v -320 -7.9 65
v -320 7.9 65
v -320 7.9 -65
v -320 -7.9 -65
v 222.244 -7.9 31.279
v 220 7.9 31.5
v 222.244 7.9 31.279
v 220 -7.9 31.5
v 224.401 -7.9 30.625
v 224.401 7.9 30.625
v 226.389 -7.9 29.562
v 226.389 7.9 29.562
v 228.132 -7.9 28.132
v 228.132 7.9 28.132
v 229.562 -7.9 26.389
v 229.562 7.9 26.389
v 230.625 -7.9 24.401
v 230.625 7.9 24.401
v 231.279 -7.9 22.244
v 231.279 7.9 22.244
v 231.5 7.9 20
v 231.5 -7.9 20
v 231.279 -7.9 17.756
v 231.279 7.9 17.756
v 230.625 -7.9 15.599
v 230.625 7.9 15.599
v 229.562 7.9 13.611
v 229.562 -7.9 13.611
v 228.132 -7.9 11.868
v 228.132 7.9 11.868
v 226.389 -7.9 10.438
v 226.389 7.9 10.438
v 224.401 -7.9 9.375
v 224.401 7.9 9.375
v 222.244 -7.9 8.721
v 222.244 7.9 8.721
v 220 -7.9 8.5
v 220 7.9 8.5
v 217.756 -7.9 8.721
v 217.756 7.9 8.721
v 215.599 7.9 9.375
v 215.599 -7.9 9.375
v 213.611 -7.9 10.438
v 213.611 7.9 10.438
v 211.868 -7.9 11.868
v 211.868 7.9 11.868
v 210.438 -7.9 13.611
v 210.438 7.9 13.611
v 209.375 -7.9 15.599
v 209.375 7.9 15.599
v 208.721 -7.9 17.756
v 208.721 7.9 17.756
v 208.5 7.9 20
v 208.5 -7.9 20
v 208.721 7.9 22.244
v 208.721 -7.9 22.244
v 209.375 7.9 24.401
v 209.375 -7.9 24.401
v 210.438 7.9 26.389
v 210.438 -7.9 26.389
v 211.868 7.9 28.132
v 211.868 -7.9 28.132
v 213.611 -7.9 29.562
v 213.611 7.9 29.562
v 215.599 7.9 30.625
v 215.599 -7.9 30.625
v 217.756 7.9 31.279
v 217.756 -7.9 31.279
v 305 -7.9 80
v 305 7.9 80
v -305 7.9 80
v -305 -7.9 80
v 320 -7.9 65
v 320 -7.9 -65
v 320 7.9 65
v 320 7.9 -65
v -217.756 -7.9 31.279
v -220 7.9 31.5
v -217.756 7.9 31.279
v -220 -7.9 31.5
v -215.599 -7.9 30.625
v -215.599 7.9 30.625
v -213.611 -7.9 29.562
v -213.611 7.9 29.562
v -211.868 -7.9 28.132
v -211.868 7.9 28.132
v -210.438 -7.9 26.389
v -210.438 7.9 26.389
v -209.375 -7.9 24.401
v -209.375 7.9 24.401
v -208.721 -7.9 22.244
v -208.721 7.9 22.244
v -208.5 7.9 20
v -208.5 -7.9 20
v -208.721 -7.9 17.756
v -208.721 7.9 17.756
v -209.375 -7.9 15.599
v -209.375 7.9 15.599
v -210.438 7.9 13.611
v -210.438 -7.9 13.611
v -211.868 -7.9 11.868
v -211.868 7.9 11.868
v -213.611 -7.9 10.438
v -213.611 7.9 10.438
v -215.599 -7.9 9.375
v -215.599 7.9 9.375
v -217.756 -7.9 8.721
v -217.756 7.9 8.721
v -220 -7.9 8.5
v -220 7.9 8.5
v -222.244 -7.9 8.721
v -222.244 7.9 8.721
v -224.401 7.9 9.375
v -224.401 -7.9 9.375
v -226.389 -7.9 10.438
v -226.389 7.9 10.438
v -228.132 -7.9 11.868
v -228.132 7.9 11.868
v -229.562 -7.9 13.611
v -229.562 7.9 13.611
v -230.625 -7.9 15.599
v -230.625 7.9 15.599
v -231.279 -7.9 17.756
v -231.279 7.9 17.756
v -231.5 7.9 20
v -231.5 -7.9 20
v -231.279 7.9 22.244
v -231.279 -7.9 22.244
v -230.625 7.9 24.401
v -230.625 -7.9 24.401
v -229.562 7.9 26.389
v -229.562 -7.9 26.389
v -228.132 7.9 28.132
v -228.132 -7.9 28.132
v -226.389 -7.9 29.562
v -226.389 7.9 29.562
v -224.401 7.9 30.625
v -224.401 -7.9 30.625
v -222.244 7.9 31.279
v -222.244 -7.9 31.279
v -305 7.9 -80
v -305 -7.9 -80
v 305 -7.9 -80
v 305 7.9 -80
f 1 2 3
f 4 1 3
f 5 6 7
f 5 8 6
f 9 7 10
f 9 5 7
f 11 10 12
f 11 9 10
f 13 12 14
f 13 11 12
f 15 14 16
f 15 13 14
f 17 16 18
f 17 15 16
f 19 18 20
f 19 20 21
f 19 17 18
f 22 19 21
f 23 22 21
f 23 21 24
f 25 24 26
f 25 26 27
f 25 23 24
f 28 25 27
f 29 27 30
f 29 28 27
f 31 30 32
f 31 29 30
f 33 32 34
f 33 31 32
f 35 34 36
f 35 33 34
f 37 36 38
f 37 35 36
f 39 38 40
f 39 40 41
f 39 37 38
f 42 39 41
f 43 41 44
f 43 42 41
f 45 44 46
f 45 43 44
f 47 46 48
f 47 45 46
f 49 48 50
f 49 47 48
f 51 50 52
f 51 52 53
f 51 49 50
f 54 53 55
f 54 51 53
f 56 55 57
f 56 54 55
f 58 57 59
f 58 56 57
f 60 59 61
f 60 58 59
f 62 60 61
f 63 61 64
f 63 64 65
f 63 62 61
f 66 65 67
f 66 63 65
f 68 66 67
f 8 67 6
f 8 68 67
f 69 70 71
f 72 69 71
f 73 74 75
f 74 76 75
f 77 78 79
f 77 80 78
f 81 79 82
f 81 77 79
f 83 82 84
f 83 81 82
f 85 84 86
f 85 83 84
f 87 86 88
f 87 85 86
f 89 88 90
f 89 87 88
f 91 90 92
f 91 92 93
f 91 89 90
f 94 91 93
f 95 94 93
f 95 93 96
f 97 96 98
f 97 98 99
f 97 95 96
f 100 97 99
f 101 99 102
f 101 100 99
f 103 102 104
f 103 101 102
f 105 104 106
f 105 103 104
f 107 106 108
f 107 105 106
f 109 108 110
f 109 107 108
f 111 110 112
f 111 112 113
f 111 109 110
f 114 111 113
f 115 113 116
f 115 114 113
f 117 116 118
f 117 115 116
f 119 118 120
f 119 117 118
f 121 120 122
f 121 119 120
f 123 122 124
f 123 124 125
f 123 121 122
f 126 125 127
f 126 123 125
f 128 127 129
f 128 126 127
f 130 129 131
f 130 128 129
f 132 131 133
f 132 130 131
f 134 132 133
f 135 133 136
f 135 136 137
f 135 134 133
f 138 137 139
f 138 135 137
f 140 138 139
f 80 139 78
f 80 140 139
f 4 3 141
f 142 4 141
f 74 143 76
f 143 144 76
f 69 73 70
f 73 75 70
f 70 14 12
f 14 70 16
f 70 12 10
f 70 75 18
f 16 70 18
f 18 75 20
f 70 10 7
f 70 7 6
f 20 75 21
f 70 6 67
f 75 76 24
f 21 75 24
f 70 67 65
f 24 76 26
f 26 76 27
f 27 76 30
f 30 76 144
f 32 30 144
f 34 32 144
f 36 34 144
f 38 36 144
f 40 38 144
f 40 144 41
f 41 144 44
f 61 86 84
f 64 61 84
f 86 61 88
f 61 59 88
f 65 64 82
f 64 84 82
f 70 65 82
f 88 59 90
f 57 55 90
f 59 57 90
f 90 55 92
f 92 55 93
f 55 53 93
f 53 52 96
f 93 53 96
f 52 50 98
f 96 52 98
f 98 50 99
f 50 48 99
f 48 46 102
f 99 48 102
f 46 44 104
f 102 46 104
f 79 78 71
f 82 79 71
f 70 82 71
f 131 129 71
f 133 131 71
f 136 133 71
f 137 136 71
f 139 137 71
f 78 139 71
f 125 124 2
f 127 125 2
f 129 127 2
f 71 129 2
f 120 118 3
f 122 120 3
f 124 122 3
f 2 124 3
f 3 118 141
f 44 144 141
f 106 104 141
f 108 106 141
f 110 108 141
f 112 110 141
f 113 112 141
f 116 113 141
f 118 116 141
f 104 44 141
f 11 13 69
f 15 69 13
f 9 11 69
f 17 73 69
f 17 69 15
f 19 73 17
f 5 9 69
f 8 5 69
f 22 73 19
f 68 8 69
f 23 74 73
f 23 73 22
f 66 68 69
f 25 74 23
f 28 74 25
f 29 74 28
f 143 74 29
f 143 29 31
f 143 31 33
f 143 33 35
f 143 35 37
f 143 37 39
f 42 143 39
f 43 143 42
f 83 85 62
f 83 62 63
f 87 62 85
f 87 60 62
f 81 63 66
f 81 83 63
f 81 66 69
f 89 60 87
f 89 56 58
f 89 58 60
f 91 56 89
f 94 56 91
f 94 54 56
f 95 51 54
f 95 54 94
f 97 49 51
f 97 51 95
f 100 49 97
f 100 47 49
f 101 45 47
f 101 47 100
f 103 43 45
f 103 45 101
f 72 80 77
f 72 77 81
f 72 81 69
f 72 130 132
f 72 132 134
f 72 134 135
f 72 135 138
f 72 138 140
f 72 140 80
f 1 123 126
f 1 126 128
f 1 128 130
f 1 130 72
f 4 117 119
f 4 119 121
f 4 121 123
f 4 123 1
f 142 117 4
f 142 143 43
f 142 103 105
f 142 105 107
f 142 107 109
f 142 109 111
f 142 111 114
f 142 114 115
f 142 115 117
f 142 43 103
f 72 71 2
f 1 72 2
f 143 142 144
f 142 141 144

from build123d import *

# Parameters (mm, degrees)
SKETCH1_R           = 11.5
BOSS_EXTRUDE1_DEPTH = 7.9


with BuildPart() as part:
    # Sketch1 → Boss-Extrude1 (new, symmetric)
    with BuildSketch(Plane(origin=(0, 0, 0), x_dir=(1, 0, 0), z_dir=(0, 1, 0))):
        Polygon((-320, 65), (-305, 80), (305, 80), (320, 65), (320, -65), (305, -80), (-305, -80), (-320, -65), align=None)
        with Locations(Location((-220, -20, 0), (0, 0, 270))):
            Circle(SKETCH1_R, mode=Mode.SUBTRACT)
        with Locations(Location((220, -20, 0), (0, 0, 270))):
            Circle(SKETCH1_R, mode=Mode.SUBTRACT)
    extrude(amount=BOSS_EXTRUDE1_DEPTH, both=True)


solid = part.part
